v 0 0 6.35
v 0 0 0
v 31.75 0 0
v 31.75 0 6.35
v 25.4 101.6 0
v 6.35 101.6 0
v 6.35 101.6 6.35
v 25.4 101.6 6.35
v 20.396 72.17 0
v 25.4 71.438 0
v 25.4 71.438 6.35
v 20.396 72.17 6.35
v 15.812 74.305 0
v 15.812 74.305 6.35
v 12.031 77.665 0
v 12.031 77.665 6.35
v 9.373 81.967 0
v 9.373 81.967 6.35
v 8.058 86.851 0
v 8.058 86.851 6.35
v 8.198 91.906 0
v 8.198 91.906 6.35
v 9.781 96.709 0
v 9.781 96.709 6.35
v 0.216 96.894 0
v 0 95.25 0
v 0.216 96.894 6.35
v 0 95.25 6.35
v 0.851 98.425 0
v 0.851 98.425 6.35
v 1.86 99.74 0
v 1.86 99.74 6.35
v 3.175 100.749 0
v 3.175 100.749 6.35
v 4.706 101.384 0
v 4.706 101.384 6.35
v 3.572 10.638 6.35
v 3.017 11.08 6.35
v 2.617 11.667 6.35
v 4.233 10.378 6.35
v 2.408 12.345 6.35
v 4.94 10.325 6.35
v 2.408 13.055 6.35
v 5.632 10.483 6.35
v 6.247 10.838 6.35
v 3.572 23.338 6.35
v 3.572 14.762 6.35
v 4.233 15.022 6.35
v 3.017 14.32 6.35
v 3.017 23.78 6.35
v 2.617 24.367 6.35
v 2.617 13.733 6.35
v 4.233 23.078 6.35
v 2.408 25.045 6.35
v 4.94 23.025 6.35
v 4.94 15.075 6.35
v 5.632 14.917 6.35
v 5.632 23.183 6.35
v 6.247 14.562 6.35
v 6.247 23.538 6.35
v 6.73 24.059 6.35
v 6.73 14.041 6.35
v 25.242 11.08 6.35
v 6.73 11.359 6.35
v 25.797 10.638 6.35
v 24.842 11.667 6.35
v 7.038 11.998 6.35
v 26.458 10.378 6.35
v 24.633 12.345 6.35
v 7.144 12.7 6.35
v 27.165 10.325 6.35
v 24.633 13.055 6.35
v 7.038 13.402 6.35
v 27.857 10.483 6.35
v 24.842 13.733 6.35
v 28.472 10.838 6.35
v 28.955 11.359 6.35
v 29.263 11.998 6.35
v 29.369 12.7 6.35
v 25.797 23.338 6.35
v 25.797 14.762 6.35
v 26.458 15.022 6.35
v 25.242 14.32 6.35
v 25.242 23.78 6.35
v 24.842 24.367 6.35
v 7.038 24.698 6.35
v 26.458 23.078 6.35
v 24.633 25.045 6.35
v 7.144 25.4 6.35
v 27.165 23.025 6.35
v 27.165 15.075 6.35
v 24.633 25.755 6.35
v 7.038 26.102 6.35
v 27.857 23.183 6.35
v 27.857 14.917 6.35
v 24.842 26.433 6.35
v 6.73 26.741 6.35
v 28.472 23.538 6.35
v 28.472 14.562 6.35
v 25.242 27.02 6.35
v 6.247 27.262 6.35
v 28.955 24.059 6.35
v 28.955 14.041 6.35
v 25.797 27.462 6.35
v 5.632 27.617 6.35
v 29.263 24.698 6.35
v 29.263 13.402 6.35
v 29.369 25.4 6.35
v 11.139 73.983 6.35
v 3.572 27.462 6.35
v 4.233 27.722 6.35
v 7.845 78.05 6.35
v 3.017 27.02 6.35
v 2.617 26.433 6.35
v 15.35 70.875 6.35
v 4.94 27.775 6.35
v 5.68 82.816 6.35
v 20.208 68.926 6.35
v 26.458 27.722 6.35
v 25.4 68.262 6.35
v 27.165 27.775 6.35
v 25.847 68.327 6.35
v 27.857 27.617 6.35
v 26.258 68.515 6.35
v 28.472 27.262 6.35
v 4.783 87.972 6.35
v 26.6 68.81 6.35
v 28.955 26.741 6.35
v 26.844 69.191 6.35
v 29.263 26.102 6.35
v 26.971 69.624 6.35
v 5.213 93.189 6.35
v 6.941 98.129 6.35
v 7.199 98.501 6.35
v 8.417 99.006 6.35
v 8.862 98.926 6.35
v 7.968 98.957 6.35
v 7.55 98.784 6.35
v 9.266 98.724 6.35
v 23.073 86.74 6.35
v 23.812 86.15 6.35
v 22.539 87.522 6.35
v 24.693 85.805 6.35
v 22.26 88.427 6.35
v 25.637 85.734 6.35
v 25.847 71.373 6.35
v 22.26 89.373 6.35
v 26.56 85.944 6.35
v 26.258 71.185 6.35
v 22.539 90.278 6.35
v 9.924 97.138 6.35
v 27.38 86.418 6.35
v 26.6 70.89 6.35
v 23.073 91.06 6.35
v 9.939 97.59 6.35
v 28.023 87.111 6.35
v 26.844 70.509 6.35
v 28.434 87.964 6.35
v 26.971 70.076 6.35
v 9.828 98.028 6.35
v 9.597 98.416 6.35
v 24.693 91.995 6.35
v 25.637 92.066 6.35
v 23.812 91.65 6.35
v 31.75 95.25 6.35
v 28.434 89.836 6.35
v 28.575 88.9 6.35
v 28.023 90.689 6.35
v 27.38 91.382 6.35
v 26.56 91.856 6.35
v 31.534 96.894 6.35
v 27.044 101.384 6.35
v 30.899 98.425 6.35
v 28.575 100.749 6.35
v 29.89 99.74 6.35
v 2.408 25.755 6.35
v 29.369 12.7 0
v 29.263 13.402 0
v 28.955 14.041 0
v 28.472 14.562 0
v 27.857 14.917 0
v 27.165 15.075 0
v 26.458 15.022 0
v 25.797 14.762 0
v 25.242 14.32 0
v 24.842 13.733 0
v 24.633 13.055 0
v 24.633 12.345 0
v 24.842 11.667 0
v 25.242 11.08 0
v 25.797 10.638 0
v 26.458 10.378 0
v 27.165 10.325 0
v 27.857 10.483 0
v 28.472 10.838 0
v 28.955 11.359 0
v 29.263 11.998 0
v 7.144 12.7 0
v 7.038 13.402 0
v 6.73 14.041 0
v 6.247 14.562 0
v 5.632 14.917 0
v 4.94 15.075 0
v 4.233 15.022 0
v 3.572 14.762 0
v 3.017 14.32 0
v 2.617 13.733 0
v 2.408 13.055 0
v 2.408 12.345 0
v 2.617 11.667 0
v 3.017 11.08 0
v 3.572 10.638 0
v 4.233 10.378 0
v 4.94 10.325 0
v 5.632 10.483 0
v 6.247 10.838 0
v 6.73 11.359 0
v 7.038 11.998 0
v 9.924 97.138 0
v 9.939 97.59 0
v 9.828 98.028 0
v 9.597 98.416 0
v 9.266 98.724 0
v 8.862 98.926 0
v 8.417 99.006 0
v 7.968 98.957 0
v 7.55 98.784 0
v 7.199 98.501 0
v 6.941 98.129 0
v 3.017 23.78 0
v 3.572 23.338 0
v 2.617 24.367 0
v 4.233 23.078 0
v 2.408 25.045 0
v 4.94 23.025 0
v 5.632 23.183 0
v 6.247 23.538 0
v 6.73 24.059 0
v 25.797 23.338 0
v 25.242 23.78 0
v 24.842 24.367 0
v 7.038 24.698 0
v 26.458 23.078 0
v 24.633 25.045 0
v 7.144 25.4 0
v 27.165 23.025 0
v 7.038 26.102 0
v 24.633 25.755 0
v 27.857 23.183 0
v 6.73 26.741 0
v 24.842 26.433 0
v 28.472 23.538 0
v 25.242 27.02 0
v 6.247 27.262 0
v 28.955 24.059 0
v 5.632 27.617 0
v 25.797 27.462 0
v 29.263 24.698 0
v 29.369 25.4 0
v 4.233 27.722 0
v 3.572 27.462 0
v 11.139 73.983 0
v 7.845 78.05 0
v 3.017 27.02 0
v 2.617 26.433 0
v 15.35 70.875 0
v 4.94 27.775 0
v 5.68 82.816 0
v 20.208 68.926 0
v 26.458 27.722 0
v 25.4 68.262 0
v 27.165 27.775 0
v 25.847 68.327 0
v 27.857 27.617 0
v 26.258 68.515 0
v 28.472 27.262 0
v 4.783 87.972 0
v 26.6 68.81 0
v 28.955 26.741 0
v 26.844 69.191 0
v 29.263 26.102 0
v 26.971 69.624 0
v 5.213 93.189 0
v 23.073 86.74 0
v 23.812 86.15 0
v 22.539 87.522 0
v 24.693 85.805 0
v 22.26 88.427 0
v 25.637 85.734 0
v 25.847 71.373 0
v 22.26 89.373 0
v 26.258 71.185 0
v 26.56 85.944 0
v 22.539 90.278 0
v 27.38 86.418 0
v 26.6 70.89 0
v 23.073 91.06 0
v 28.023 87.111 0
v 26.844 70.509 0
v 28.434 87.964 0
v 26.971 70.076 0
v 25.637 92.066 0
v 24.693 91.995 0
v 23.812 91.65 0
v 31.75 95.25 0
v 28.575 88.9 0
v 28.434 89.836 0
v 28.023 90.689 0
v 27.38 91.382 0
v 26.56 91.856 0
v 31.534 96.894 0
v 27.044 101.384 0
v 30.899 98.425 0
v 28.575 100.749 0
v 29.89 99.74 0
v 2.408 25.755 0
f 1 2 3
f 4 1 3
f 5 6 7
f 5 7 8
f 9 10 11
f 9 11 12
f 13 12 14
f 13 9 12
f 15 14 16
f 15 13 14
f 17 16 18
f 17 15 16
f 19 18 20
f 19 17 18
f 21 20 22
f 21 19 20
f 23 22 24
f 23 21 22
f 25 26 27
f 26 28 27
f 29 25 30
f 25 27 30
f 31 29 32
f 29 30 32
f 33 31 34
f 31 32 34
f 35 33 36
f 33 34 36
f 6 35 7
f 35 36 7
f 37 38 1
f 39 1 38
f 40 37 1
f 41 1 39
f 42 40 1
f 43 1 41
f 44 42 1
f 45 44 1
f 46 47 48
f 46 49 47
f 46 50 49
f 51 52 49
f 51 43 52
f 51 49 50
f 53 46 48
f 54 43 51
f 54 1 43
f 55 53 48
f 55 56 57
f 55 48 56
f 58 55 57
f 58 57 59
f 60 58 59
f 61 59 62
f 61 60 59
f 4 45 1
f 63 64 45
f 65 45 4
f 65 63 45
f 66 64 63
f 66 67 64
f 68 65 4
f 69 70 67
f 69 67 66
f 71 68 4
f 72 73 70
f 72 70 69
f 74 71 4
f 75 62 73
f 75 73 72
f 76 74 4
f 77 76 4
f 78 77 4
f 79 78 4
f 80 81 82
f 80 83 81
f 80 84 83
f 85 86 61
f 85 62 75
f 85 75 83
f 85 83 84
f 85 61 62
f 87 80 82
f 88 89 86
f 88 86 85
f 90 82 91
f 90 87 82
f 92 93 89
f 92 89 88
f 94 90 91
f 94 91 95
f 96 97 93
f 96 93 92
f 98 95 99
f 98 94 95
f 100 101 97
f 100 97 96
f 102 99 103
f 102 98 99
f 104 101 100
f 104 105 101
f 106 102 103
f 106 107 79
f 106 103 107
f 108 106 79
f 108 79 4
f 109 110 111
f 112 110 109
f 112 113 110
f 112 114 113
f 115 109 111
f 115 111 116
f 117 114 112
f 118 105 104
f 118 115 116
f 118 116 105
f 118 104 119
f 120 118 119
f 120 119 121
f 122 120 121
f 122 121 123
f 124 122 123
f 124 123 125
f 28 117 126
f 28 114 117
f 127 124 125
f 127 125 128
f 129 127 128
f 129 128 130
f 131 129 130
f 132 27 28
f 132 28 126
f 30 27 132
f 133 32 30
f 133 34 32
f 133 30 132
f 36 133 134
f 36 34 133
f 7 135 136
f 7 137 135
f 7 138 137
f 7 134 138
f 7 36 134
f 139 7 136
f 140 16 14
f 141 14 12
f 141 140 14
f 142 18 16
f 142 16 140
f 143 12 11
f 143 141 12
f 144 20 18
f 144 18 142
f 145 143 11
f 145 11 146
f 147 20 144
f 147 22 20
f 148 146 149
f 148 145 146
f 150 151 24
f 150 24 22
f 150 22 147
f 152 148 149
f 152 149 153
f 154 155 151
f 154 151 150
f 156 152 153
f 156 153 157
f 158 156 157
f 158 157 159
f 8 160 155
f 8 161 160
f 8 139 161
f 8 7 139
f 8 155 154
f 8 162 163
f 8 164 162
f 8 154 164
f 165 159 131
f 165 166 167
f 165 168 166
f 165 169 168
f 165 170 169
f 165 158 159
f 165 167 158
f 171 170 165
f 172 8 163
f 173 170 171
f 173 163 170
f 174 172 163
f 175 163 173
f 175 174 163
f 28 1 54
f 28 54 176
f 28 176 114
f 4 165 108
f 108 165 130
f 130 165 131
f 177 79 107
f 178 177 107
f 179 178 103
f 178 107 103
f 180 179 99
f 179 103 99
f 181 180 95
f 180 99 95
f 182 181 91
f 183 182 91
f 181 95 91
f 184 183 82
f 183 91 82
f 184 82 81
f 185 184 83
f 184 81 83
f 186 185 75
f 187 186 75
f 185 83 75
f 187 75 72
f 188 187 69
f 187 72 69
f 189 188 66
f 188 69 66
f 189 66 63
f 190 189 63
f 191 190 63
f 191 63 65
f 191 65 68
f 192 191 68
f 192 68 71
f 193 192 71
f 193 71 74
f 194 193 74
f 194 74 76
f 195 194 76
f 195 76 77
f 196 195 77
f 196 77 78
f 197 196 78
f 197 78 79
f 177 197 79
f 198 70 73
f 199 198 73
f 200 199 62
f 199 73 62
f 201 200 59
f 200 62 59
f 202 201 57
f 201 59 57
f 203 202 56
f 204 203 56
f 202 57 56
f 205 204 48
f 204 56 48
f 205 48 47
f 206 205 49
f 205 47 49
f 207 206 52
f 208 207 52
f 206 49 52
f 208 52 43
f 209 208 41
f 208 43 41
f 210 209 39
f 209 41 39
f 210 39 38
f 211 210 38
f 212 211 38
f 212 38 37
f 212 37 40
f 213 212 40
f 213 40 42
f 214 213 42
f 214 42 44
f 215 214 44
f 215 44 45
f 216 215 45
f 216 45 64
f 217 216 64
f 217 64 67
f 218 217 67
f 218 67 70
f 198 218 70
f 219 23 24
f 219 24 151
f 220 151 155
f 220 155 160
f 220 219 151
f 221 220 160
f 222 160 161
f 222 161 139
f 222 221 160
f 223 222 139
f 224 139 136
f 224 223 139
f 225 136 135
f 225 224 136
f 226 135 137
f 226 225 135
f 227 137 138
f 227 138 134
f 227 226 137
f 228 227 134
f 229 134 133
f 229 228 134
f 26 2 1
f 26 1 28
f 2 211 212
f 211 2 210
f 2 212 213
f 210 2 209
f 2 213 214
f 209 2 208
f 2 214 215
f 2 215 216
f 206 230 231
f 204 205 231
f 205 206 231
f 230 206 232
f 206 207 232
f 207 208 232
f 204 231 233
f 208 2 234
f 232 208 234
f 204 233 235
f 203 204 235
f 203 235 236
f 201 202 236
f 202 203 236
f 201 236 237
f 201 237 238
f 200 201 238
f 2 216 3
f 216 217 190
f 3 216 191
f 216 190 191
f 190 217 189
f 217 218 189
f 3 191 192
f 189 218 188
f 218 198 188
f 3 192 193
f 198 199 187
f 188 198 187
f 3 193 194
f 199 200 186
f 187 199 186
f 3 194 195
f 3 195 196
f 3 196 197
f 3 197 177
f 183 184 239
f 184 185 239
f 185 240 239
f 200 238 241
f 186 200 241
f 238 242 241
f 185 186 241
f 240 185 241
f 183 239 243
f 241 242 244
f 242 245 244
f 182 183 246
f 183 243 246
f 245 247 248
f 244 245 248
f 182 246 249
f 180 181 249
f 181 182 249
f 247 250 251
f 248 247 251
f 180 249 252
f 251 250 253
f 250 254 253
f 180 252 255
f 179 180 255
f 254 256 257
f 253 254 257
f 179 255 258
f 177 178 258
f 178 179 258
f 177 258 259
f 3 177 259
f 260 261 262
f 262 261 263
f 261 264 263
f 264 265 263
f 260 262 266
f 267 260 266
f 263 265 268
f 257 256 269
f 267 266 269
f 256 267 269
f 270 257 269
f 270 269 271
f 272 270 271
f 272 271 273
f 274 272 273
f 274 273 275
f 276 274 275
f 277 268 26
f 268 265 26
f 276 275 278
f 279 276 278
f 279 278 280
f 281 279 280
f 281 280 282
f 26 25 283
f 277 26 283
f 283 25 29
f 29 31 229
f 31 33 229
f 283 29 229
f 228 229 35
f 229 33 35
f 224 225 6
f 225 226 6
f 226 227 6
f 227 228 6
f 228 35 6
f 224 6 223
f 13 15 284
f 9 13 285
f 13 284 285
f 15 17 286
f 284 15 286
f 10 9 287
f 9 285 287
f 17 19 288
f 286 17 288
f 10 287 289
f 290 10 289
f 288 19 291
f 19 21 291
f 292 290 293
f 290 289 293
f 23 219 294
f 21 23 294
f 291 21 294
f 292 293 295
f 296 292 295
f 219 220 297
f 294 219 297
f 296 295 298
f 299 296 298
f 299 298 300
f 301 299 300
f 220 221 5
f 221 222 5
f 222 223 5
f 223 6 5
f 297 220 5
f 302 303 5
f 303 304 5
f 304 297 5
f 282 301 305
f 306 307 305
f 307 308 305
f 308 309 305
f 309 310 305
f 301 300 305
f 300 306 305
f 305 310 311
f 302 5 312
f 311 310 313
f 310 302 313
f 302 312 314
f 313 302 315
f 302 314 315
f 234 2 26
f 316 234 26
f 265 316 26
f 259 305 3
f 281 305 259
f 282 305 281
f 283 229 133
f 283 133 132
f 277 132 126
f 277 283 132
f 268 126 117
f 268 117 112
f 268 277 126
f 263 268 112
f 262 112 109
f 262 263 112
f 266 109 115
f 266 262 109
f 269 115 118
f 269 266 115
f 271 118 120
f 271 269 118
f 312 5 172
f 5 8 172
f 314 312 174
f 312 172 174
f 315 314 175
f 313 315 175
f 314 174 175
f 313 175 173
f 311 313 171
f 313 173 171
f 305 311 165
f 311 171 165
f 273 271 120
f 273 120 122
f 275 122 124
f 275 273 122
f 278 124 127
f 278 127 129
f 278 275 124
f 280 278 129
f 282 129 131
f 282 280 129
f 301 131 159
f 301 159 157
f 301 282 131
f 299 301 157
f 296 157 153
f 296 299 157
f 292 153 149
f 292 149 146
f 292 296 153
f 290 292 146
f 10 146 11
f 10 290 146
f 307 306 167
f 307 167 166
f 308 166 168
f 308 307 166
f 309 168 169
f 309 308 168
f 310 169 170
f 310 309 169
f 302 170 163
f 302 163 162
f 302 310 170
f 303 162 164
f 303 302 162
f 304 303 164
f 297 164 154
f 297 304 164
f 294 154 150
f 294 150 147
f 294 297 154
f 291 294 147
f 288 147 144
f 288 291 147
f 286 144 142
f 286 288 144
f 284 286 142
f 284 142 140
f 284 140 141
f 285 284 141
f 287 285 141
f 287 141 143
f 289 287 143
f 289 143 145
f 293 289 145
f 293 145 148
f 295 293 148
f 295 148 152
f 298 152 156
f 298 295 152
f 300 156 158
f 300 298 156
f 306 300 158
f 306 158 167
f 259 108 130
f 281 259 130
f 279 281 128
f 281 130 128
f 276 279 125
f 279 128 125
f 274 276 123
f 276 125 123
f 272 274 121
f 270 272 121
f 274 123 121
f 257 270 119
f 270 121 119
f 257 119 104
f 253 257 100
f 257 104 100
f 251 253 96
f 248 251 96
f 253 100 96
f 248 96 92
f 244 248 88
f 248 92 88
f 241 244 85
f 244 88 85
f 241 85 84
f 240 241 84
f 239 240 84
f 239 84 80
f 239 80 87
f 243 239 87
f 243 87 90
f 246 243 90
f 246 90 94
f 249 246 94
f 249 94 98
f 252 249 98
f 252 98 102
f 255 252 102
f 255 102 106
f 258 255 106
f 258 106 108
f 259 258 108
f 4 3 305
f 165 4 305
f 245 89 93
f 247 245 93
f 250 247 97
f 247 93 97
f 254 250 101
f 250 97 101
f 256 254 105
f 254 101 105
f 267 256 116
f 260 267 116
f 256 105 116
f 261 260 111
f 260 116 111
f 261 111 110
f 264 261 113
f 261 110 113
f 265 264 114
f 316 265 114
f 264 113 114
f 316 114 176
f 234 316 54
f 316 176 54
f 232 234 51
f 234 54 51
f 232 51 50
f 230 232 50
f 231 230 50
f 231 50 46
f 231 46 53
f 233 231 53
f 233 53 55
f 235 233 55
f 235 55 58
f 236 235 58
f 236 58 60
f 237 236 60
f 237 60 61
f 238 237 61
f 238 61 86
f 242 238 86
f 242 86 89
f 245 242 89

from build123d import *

# Parameters (mm, degrees)
SKETCH1_W           = 31.75
SKETCH1_H           = 101.6
SKETCH1_R           = 3.175
BOSS_EXTRUDE1_DEPTH = 6.35
SKETCH2_R           = 2.38125
CUT_EXTRUDE1_DEPTH  = 107.634633211
FILLET1_R           = 6.35


with BuildPart() as part:
    # Sketch1 → Boss-Extrude1 (new body)
    with BuildSketch(Plane.XY):
        with Locations((15.875, 50.8)):
            Rectangle(SKETCH1_W, SKETCH1_H)
        with Locations((25.4, 88.9)):
            Circle(SKETCH1_R, mode=Mode.SUBTRACT)
        with BuildLine():
            ThreePointArc((6.941258846, 98.129370577), (7.844693943, 78.050224174), (25.4, 68.2625))
            ThreePointArc((25.4, 68.2625), (26.9875, 69.85), (25.4, 71.4375))
            ThreePointArc((25.4, 71.4375), (10.545510259, 79.719420455), (9.781065177, 96.709467411))
            ThreePointArc((9.781065177, 96.709467411), (9.071113594, 98.83932216), (6.941258846, 98.129370577))
        make_face(mode=Mode.SUBTRACT)
    extrude(amount=BOSS_EXTRUDE1_DEPTH)

    # Sketch2 → Cut-Extrude1 (cut, through all)
    with BuildSketch(Plane.XY.offset(6.35)):
        with Locations((4.7625, 25.4)):
            Circle(SKETCH2_R)
        with Locations((26.9875, 25.4)):
            Circle(SKETCH2_R)
        with Locations((4.7625, 12.7)):
            Circle(SKETCH2_R)
        with Locations((26.9875, 12.7)):
            Circle(SKETCH2_R)
    extrude(amount=-CUT_EXTRUDE1_DEPTH, mode=Mode.SUBTRACT)

    # Fillet1
    fillet1_edges = [part.edges().sort_by_distance(p)[0] for p in [
        (0, 101.6, 3.175),
        (31.75, 101.6, 3.175),
    ]]
    fillet(fillet1_edges, radius=FILLET1_R)


solid = part.part
